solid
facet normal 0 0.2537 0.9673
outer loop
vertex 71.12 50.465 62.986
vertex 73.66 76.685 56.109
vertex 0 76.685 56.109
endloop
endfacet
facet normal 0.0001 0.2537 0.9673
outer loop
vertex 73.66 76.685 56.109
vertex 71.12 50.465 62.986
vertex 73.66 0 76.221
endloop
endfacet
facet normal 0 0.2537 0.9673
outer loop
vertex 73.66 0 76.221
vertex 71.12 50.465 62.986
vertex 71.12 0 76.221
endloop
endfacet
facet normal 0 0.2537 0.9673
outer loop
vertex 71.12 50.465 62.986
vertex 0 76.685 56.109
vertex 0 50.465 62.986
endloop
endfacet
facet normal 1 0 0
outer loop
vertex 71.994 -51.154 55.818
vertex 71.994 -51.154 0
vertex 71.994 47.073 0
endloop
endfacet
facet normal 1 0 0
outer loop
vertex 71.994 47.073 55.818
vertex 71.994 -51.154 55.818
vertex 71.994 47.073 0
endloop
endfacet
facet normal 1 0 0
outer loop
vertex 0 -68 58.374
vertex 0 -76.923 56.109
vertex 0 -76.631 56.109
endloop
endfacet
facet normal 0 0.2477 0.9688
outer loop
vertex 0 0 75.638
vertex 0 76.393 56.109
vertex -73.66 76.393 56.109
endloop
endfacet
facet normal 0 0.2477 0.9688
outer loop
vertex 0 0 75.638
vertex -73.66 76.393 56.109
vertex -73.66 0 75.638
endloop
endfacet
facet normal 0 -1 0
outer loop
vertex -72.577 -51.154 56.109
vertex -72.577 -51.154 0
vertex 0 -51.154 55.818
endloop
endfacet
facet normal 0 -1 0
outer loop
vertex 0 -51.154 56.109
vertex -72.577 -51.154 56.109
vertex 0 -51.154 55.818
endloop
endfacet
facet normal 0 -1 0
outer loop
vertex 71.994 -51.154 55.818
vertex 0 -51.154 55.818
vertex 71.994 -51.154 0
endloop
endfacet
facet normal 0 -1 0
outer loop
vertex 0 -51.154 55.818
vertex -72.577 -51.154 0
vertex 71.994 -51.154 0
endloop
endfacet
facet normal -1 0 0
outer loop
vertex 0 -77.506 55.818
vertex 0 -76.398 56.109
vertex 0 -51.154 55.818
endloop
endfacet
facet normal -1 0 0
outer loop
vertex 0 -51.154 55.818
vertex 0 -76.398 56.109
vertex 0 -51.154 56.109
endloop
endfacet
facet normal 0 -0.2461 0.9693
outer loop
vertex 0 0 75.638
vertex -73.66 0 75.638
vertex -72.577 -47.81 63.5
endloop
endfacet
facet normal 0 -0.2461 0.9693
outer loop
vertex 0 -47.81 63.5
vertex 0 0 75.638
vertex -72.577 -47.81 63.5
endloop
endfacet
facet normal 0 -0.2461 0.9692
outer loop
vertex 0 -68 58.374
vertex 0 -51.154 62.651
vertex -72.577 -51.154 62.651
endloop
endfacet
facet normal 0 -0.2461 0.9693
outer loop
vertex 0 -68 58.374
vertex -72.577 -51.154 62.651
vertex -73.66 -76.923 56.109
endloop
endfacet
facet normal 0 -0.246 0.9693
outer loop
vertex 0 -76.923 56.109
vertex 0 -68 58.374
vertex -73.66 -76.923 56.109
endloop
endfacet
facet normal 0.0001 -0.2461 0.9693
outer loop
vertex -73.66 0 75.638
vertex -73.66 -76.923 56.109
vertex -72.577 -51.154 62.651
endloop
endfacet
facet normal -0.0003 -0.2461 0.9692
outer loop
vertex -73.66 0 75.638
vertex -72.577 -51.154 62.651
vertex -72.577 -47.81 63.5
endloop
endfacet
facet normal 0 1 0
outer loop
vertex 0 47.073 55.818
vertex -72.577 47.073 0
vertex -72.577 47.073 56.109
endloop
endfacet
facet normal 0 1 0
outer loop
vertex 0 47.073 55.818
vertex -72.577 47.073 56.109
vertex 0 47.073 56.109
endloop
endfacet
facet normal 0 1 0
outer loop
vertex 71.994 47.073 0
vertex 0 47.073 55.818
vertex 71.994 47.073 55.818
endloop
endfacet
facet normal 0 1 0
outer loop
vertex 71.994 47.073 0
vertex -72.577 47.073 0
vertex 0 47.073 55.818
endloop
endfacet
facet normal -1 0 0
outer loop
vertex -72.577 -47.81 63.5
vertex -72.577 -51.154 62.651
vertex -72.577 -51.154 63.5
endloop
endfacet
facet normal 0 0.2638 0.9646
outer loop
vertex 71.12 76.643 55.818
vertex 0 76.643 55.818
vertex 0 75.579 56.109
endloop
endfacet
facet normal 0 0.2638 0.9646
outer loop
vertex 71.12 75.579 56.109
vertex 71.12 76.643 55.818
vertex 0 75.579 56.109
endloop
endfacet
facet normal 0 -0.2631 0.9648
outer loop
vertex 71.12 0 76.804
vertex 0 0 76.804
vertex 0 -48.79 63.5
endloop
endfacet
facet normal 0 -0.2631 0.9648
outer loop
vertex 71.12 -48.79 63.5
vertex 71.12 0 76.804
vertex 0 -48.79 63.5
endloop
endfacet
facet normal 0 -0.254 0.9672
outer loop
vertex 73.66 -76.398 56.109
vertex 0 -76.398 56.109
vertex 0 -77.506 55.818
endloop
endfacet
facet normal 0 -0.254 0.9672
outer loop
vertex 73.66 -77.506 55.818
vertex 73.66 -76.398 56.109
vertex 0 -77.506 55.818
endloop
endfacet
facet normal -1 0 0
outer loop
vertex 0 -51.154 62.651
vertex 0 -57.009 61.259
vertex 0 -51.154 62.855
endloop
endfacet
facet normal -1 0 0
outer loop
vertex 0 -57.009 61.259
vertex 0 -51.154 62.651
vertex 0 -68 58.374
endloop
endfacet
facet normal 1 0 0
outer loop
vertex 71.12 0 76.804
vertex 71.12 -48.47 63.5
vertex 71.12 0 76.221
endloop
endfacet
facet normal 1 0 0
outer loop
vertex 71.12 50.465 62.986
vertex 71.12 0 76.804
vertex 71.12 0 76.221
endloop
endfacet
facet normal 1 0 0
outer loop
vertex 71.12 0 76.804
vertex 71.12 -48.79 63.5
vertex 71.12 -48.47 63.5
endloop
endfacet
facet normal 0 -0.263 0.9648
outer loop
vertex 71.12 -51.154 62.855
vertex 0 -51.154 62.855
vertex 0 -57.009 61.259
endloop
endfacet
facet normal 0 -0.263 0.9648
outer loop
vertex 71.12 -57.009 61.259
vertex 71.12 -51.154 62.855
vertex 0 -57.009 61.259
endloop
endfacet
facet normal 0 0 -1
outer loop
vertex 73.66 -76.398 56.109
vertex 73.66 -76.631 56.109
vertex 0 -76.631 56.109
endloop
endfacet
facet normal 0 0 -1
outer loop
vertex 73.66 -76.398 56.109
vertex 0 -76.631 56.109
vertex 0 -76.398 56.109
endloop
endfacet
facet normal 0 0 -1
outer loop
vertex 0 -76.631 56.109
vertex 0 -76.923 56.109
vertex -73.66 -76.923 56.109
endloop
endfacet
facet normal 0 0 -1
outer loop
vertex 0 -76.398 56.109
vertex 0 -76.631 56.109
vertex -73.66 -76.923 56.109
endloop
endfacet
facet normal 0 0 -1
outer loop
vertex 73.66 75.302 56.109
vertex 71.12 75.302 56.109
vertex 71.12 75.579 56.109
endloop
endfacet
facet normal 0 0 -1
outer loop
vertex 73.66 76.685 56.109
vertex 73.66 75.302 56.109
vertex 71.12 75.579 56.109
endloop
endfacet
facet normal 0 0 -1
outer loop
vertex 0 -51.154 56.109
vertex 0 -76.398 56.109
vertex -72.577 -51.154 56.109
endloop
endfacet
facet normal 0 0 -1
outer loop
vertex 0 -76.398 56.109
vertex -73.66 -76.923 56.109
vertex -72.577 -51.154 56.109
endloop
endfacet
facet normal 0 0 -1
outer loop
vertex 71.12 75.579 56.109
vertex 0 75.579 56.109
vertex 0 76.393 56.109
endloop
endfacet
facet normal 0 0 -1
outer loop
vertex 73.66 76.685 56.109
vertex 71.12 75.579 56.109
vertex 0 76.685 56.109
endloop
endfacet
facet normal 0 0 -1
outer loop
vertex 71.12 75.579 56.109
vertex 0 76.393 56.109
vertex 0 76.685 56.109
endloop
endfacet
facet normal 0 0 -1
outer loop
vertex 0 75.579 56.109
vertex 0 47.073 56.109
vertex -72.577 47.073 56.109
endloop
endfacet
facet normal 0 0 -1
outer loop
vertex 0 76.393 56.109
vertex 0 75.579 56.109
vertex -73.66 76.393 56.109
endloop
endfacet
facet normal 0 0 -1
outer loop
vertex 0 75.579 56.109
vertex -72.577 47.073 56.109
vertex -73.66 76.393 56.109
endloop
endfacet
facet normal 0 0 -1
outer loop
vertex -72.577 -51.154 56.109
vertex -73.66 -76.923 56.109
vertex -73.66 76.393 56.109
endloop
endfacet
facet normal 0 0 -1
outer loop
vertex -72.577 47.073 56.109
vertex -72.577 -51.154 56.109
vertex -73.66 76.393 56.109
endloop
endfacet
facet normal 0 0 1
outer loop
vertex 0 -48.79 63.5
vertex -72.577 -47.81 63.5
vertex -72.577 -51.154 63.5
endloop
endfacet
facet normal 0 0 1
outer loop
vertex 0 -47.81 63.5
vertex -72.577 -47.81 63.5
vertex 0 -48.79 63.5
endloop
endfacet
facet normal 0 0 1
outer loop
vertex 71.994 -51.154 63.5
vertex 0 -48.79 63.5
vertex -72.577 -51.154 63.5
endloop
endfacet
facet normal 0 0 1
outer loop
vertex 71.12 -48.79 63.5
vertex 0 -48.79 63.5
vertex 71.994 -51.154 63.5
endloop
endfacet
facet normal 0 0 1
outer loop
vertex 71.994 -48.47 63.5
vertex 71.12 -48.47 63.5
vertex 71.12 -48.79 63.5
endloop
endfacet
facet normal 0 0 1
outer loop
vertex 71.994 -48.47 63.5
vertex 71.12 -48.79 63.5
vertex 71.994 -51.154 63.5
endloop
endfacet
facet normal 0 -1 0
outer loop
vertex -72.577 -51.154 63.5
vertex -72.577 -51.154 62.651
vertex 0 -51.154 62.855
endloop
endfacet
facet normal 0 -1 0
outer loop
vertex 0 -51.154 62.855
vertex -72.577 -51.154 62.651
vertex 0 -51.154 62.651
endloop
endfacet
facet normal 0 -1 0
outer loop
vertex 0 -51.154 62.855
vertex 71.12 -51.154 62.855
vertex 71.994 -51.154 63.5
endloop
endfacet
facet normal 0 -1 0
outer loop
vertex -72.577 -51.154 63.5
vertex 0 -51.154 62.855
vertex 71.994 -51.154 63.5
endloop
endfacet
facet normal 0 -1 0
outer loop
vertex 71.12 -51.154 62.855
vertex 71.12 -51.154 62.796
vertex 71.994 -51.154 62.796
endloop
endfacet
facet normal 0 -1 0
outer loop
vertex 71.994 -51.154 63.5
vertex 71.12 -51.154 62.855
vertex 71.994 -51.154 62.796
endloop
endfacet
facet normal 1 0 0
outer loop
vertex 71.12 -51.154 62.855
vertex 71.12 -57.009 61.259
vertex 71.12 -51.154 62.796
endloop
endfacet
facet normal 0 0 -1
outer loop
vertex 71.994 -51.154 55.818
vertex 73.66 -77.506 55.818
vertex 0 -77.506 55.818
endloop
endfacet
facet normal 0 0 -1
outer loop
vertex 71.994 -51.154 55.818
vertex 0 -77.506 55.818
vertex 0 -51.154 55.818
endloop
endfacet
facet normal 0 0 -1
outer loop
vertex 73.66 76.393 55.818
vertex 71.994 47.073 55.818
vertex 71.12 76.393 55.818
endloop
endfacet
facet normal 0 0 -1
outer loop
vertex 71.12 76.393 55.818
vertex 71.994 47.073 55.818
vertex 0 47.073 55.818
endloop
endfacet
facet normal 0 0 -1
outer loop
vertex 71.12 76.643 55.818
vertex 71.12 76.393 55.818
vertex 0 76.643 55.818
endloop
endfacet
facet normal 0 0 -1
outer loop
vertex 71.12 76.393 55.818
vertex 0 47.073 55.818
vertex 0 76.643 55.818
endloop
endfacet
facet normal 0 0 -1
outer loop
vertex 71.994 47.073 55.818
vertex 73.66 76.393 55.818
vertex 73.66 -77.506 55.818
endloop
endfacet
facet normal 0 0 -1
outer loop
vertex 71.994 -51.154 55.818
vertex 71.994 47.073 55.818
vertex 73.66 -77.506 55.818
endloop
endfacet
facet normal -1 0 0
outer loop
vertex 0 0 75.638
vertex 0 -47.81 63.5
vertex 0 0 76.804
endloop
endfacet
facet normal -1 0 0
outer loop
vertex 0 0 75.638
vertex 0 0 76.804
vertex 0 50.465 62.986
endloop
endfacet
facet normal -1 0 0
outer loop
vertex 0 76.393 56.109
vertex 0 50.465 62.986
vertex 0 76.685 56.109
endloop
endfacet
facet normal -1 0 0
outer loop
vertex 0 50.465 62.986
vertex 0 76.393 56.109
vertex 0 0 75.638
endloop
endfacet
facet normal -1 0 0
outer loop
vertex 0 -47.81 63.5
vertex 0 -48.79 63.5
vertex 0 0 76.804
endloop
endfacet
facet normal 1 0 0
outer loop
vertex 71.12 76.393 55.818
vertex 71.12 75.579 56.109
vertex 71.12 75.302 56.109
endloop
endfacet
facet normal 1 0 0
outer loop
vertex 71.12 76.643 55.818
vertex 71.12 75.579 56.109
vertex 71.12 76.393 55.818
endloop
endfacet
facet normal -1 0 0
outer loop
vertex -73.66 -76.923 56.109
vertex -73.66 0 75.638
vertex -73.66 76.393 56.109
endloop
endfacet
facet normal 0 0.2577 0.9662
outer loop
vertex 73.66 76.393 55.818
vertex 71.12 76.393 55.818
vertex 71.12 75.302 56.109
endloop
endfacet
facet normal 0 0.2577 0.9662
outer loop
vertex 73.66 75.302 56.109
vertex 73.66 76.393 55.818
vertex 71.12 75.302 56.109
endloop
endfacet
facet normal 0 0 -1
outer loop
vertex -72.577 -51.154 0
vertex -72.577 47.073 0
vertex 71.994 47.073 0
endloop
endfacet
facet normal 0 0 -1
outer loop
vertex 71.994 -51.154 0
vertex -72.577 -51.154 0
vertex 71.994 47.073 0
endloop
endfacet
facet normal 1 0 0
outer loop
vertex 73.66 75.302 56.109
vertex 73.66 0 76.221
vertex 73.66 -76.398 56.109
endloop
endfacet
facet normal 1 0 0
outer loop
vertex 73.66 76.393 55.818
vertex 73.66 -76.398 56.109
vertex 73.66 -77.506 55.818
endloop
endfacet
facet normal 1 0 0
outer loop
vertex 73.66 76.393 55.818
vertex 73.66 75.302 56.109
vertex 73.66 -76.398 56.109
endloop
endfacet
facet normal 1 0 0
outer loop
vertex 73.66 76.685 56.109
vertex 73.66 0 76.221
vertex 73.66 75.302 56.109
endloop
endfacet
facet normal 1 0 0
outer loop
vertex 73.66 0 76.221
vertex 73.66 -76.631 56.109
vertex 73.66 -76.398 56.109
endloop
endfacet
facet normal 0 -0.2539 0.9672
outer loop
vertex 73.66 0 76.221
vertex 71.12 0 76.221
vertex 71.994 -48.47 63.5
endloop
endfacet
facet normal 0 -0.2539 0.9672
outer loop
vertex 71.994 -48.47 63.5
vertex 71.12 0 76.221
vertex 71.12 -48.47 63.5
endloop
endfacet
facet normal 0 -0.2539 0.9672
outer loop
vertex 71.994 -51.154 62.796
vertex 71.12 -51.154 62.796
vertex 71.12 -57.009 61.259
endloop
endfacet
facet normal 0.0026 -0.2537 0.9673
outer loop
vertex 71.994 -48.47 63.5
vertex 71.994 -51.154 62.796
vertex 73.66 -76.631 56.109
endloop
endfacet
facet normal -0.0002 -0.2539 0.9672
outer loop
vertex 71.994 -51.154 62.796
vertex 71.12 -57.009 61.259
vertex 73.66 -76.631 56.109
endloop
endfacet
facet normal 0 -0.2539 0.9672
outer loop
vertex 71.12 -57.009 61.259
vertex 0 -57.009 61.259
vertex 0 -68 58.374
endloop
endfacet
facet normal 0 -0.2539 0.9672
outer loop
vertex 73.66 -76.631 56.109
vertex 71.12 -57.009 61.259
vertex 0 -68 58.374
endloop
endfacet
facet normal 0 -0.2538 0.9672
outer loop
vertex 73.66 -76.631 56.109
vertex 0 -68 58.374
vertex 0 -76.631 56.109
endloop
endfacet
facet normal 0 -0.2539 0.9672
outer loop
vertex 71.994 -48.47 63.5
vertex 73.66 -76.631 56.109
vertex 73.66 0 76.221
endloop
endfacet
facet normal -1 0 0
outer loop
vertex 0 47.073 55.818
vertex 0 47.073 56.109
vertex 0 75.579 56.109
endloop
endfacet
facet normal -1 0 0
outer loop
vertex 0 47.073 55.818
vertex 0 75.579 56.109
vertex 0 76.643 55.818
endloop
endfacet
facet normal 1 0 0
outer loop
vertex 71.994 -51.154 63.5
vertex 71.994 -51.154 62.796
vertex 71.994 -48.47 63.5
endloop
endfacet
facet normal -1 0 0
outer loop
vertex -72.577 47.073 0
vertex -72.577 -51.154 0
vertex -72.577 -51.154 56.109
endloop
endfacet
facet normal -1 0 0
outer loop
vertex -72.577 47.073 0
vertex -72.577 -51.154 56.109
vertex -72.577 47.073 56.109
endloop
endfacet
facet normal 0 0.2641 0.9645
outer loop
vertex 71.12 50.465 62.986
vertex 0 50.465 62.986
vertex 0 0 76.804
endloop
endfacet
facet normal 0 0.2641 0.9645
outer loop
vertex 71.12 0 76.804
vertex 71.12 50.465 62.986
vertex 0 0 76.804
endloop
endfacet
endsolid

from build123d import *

# Parameters (mm, degrees)
F0_W      = 144.5718035102
F0_H      = 98.2272140682
F1_DEPTH  = 63.5
F3_DEPTH  = 73.66
F1_FACE_W = 98.2272140682
F1_FACE_H = 55.8175444603
F5_DEPTH  = 73.66
F7_DEPTH  = 71.12
F9_DEPTH  = 73.66


with BuildPart() as f1:
    # F0 (on Top) → F1 (new body)
    with BuildSketch(Plane.XY):
        with Locations((-0.2914778888, -2.040328458)):
            Rectangle(F0_W, F0_H)
    extrude(amount=F1_DEPTH)

    # F2 (on Right) → F3 (join)
    with BuildSketch(Plane.YZ):
        Polygon((-77.5057077408, 55.8175444603), (76.3933062553, 55.8175444603), (0, 76.2208253145), align=None)
    extrude(amount=F3_DEPTH)

    # F4 (on Right) + F3_face (on face) + F1_face (on face) → F5 (join)
    with BuildSketch(Plane.YZ):
        Polygon((0, 75.6378695369), (-76.9227594137, 56.1090186238), (76.3933062553, 56.1090186238), align=None)
    with BuildSketch(Plane(origin=(73.66, -0.3708004951, 62.6186380784), x_dir=(0, 1, 0), z_dir=(1, 0, 0))):
        Polygon((-77.1349072456, -6.8010936181), (76.7641067505, -6.8010936181), (0.3708004951, 13.6021872362), align=None)
    with BuildSketch(Plane(origin=(71.9944238663, -2.040328458, 27.9087722301), x_dir=(0, 1, 0), z_dir=(1, 0, 0))):
        Rectangle(F1_FACE_W, F1_FACE_H)
    extrude(amount=-F5_DEPTH)

    # F6 (on Right) → F7 (join)
    with BuildSketch(Plane.YZ):
        Polygon((-76.9643932581, 55.8175444603), (76.6431465745, 55.8175444603), (0, 76.8037736416), align=None)
    extrude(amount=F7_DEPTH)

    # F8 (on Right) + F5_face (on face) → F9 (join)
    with BuildSketch(Plane.YZ):
        Polygon((0, 76.2208253145), (-76.6312852502, 56.1090186238), (76.6847804189, 56.1090186238), align=None)
    with BuildSketch(Plane(origin=(-73.66, -0.1764843861, 62.6186355948), x_dir=(0, 1, 0), z_dir=(-1, 0, 0))):
        Polygon((-76.7462750276, 6.509616971), (0.1764843861, -13.019233942), (76.5697906415, 6.509616971), align=None)
    extrude(amount=F9_DEPTH, dir=(1, 0, 0))


solid = f1.part
